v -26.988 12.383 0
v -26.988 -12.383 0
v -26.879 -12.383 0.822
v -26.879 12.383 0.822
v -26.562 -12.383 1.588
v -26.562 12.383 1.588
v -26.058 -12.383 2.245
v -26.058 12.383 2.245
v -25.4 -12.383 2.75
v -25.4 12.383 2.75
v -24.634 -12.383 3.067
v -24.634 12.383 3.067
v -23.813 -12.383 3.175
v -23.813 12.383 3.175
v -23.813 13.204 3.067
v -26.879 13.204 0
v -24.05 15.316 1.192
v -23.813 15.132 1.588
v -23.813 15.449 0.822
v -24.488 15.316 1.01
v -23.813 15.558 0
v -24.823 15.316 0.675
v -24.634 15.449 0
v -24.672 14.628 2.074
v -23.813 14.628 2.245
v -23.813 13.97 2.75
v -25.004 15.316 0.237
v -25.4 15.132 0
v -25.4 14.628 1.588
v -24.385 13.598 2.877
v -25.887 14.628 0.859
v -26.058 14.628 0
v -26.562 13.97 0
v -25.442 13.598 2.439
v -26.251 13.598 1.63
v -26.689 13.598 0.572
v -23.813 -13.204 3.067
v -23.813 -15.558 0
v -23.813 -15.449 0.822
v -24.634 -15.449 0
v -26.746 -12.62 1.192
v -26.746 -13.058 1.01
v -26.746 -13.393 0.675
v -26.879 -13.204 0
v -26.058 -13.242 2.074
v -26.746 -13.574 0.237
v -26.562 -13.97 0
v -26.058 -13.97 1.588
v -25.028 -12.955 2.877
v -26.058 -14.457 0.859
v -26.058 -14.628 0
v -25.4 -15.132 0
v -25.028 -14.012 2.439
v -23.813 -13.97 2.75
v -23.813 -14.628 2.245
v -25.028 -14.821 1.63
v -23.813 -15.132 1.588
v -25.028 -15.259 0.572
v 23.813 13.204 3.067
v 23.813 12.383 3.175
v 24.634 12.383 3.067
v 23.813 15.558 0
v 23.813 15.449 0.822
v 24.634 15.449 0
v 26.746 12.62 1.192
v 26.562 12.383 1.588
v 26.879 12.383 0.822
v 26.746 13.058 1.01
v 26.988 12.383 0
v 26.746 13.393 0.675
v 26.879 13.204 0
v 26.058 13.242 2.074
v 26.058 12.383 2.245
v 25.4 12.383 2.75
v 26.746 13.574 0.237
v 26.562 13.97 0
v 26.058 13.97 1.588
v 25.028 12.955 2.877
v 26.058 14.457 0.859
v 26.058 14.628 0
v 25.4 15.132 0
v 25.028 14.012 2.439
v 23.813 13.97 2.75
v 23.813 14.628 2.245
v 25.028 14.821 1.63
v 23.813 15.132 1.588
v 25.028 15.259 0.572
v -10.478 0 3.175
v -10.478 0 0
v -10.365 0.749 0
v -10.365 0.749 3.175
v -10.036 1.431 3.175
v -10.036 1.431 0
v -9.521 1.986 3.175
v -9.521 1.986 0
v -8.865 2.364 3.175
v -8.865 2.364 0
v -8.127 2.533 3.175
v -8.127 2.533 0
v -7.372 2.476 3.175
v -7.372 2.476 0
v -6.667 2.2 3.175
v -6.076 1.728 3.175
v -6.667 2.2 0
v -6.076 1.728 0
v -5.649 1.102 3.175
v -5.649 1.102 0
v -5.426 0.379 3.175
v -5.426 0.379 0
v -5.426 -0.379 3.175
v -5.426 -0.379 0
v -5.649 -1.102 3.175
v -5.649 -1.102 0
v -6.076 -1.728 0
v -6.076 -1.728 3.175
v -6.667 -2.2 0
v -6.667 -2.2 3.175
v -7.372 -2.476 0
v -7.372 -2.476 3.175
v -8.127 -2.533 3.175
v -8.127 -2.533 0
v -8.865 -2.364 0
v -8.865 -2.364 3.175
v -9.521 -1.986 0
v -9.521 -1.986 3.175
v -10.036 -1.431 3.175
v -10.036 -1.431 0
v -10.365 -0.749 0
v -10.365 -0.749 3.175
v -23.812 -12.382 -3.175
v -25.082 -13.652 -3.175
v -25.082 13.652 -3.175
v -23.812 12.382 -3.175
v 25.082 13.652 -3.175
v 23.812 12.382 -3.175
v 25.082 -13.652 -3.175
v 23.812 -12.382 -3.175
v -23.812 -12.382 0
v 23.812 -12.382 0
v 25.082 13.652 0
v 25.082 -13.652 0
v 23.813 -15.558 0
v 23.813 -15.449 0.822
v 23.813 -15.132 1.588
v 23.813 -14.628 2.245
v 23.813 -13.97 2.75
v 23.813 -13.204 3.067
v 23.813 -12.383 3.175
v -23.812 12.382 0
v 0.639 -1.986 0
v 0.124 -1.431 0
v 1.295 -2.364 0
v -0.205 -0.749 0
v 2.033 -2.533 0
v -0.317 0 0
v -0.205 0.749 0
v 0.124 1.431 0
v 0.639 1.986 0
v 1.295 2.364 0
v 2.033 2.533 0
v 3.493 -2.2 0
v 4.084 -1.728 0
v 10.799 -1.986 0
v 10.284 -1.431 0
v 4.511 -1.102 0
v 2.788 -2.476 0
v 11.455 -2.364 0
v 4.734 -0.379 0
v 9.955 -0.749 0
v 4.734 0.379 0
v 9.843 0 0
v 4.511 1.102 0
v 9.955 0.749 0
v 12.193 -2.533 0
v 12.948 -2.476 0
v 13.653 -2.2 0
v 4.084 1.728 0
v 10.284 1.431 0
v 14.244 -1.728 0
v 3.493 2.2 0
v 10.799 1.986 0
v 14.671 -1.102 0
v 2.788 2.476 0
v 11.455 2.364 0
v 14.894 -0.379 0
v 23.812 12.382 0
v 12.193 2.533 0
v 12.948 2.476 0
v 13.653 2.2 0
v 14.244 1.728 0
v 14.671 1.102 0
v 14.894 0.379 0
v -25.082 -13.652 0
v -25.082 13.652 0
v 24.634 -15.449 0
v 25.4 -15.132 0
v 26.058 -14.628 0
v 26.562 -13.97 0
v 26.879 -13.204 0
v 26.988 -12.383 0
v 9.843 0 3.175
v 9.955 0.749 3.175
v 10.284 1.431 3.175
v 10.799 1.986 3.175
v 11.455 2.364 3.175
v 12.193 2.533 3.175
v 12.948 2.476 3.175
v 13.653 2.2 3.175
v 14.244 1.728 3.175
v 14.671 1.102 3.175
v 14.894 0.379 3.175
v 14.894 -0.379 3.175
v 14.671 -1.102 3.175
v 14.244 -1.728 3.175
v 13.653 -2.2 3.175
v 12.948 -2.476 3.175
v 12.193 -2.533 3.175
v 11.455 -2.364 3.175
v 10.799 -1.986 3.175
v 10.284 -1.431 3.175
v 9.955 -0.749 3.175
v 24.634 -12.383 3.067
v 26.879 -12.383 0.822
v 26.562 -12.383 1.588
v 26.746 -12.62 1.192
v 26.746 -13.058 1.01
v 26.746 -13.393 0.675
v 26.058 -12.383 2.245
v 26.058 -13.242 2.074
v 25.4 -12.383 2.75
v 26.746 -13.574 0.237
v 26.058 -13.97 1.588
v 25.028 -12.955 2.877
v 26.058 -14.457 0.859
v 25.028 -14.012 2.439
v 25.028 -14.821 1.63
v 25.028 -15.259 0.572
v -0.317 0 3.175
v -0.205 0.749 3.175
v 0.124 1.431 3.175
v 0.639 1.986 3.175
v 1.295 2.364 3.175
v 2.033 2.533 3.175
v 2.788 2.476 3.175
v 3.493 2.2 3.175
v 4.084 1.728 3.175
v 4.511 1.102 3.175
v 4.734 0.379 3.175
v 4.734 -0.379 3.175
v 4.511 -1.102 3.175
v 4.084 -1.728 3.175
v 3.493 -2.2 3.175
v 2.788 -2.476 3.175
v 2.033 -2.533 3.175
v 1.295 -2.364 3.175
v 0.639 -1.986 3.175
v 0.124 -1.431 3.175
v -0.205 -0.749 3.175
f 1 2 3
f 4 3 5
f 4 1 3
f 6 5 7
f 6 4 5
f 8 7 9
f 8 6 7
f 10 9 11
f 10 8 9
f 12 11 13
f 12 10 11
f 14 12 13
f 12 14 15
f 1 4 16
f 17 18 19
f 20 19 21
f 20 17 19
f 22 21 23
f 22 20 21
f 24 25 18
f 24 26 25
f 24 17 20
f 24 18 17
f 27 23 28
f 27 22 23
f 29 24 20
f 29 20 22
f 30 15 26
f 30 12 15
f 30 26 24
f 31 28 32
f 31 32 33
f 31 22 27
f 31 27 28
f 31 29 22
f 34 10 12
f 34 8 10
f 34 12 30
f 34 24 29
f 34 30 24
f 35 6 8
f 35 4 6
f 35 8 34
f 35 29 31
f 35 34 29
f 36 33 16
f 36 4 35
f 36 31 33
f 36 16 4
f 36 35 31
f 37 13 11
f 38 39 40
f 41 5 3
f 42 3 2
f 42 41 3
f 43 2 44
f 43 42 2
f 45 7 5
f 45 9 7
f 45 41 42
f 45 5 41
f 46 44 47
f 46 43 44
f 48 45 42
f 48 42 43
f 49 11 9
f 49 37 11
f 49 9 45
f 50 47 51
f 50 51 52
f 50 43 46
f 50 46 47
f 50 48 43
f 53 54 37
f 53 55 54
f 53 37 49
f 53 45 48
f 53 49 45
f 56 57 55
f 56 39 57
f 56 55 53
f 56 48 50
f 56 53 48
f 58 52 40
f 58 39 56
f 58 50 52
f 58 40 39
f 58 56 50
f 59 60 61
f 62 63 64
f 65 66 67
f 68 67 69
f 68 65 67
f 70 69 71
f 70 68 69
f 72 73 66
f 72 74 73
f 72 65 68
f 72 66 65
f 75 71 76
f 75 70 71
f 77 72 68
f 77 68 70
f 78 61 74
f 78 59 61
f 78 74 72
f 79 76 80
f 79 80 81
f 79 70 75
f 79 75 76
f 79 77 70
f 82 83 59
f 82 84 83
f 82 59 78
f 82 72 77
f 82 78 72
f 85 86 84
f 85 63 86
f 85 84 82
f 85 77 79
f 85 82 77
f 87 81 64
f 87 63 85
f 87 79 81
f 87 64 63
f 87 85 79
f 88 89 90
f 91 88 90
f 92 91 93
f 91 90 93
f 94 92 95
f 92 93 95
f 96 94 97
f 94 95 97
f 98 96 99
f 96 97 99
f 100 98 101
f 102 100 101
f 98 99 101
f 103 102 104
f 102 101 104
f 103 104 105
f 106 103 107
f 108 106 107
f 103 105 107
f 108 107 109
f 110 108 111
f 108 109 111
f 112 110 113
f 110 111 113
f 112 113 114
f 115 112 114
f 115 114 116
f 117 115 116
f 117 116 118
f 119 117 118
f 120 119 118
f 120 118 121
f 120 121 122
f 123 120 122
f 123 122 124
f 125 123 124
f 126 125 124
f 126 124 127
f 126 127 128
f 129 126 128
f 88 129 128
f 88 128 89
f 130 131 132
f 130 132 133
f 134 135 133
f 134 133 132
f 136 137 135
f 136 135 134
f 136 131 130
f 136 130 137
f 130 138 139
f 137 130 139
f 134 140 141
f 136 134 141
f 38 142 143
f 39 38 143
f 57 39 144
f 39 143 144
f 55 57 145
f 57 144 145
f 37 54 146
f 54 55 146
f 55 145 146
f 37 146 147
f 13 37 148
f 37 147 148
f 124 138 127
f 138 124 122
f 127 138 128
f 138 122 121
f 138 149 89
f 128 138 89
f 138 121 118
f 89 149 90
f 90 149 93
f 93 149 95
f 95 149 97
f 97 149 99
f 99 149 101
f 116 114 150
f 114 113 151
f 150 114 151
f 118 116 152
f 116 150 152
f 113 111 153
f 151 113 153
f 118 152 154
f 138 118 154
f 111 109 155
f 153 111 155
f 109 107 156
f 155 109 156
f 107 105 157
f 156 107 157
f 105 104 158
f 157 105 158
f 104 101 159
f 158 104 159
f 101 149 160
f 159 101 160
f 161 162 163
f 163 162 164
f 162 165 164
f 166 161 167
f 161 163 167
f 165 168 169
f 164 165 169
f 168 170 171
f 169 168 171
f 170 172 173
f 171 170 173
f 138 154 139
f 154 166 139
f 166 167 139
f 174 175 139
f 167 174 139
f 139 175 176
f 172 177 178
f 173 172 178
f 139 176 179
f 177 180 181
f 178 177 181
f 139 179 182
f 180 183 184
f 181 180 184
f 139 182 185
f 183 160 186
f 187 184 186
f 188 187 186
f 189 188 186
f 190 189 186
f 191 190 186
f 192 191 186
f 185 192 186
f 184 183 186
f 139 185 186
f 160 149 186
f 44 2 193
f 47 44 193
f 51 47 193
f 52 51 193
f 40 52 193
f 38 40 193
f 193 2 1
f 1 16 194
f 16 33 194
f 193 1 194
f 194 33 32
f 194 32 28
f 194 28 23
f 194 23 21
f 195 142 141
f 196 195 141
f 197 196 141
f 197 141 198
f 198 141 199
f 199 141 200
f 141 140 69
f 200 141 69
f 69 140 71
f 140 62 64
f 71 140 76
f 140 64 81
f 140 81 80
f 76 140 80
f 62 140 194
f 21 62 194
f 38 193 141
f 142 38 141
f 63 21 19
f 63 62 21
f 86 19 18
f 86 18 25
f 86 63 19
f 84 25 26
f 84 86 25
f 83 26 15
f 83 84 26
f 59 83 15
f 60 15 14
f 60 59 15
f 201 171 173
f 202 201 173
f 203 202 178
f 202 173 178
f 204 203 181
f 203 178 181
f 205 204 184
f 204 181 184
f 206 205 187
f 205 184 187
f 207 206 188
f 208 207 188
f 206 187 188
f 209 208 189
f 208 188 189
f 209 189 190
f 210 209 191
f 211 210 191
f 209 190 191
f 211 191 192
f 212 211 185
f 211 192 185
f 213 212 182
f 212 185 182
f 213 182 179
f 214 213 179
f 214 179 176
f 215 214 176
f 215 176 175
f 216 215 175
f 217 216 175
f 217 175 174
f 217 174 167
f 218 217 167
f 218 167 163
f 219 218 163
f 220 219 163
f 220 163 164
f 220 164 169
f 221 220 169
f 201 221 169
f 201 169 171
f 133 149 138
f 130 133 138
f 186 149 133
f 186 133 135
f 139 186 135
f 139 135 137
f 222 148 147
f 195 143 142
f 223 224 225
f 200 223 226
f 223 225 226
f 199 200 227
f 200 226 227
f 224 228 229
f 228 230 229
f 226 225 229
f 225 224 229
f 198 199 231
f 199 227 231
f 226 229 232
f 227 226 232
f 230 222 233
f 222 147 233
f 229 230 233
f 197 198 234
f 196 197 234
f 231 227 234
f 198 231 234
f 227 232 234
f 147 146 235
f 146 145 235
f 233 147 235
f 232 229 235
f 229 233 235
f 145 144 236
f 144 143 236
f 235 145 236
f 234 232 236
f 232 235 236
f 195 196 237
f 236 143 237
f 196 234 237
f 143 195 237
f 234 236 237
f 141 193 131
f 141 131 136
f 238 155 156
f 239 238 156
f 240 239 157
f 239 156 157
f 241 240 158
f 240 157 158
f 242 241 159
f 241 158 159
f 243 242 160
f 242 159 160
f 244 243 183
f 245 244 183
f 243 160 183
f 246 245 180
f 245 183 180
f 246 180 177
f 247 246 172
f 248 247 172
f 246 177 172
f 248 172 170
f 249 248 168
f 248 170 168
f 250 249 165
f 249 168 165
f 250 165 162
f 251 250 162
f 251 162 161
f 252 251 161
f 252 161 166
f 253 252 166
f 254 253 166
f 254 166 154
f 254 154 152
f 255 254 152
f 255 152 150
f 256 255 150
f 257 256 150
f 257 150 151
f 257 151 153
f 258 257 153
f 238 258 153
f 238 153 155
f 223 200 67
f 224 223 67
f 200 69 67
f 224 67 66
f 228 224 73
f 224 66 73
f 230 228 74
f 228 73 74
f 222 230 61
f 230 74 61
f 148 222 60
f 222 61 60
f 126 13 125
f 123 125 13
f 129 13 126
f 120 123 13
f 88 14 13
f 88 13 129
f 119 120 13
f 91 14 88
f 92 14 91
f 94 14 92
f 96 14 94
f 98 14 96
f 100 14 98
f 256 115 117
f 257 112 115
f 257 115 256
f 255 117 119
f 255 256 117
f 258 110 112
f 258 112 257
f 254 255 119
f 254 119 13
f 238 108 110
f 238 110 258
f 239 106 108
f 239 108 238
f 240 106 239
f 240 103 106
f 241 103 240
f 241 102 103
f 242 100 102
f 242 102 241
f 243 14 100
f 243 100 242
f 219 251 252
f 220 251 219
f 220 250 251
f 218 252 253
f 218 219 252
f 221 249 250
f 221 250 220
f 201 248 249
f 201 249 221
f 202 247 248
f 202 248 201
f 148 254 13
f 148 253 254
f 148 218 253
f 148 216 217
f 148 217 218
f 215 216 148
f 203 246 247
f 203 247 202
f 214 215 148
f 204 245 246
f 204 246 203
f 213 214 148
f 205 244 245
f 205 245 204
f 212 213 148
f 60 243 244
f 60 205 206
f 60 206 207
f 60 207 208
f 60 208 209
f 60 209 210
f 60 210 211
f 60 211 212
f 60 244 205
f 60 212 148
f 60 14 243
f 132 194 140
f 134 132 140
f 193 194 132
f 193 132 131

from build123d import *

# Parameters (mm, degrees)
F0_W     = 53.975
F0_H     = 31.115
F1_DEPTH = 3.175
F2_R     = 3.17499
F3_W     = 50.165
F3_H     = 27.305
F3_W_2   = 47.625
F3_H_2   = 24.765
F4_DEPTH = 3.175
F6_D     = 5.08


# Not quite as in the source:
# - a fillet or chamfer is up to 0.001 mm smaller than in the source, because OpenCascade refuses the exact size


with BuildPart() as f1:
    # F0 (on Top) → F1 (new body)
    with BuildSketch(Plane.XY):
        Rectangle(F0_W, F0_H)
    extrude(amount=F1_DEPTH)

    # F2 (radius 3.175 in the source; OpenCascade refuses exactly that, so slightly less here)
    f2_edges = [f1.edges().sort_by_distance(p)[0] for p in [
        (0, -15.5575, 3.175),
        (-26.9875, 0, 3.175),
        (0, 15.5575, 3.175),
        (26.9875, 0, 3.175),
        (26.9875, -15.5575, 1.5875),
        (26.9875, 15.5575, 1.5875),
        (-26.9875, 15.5575, 1.5875),
        (-26.9875, -15.5575, 1.5875),
    ]]
    fillet(f2_edges, radius=F2_R)

    # F3 (on face) → F4 (join)
    with BuildSketch(Plane(origin=(0, 0, 0), x_dir=(1, 0, 0), z_dir=(0, 0, -1))):
        Rectangle(F3_W, F3_H)
        Rectangle(F3_W_2, F3_H_2, mode=Mode.SUBTRACT)
    extrude(amount=F4_DEPTH)

    # F6 (through all)
    with Locations(Plane.XY.offset(3.175)):
        with Locations((-7.9375, 0), (2.2225, 0), (12.3825, 0)):
            Hole(F6_D / 2)


solid = f1.part
